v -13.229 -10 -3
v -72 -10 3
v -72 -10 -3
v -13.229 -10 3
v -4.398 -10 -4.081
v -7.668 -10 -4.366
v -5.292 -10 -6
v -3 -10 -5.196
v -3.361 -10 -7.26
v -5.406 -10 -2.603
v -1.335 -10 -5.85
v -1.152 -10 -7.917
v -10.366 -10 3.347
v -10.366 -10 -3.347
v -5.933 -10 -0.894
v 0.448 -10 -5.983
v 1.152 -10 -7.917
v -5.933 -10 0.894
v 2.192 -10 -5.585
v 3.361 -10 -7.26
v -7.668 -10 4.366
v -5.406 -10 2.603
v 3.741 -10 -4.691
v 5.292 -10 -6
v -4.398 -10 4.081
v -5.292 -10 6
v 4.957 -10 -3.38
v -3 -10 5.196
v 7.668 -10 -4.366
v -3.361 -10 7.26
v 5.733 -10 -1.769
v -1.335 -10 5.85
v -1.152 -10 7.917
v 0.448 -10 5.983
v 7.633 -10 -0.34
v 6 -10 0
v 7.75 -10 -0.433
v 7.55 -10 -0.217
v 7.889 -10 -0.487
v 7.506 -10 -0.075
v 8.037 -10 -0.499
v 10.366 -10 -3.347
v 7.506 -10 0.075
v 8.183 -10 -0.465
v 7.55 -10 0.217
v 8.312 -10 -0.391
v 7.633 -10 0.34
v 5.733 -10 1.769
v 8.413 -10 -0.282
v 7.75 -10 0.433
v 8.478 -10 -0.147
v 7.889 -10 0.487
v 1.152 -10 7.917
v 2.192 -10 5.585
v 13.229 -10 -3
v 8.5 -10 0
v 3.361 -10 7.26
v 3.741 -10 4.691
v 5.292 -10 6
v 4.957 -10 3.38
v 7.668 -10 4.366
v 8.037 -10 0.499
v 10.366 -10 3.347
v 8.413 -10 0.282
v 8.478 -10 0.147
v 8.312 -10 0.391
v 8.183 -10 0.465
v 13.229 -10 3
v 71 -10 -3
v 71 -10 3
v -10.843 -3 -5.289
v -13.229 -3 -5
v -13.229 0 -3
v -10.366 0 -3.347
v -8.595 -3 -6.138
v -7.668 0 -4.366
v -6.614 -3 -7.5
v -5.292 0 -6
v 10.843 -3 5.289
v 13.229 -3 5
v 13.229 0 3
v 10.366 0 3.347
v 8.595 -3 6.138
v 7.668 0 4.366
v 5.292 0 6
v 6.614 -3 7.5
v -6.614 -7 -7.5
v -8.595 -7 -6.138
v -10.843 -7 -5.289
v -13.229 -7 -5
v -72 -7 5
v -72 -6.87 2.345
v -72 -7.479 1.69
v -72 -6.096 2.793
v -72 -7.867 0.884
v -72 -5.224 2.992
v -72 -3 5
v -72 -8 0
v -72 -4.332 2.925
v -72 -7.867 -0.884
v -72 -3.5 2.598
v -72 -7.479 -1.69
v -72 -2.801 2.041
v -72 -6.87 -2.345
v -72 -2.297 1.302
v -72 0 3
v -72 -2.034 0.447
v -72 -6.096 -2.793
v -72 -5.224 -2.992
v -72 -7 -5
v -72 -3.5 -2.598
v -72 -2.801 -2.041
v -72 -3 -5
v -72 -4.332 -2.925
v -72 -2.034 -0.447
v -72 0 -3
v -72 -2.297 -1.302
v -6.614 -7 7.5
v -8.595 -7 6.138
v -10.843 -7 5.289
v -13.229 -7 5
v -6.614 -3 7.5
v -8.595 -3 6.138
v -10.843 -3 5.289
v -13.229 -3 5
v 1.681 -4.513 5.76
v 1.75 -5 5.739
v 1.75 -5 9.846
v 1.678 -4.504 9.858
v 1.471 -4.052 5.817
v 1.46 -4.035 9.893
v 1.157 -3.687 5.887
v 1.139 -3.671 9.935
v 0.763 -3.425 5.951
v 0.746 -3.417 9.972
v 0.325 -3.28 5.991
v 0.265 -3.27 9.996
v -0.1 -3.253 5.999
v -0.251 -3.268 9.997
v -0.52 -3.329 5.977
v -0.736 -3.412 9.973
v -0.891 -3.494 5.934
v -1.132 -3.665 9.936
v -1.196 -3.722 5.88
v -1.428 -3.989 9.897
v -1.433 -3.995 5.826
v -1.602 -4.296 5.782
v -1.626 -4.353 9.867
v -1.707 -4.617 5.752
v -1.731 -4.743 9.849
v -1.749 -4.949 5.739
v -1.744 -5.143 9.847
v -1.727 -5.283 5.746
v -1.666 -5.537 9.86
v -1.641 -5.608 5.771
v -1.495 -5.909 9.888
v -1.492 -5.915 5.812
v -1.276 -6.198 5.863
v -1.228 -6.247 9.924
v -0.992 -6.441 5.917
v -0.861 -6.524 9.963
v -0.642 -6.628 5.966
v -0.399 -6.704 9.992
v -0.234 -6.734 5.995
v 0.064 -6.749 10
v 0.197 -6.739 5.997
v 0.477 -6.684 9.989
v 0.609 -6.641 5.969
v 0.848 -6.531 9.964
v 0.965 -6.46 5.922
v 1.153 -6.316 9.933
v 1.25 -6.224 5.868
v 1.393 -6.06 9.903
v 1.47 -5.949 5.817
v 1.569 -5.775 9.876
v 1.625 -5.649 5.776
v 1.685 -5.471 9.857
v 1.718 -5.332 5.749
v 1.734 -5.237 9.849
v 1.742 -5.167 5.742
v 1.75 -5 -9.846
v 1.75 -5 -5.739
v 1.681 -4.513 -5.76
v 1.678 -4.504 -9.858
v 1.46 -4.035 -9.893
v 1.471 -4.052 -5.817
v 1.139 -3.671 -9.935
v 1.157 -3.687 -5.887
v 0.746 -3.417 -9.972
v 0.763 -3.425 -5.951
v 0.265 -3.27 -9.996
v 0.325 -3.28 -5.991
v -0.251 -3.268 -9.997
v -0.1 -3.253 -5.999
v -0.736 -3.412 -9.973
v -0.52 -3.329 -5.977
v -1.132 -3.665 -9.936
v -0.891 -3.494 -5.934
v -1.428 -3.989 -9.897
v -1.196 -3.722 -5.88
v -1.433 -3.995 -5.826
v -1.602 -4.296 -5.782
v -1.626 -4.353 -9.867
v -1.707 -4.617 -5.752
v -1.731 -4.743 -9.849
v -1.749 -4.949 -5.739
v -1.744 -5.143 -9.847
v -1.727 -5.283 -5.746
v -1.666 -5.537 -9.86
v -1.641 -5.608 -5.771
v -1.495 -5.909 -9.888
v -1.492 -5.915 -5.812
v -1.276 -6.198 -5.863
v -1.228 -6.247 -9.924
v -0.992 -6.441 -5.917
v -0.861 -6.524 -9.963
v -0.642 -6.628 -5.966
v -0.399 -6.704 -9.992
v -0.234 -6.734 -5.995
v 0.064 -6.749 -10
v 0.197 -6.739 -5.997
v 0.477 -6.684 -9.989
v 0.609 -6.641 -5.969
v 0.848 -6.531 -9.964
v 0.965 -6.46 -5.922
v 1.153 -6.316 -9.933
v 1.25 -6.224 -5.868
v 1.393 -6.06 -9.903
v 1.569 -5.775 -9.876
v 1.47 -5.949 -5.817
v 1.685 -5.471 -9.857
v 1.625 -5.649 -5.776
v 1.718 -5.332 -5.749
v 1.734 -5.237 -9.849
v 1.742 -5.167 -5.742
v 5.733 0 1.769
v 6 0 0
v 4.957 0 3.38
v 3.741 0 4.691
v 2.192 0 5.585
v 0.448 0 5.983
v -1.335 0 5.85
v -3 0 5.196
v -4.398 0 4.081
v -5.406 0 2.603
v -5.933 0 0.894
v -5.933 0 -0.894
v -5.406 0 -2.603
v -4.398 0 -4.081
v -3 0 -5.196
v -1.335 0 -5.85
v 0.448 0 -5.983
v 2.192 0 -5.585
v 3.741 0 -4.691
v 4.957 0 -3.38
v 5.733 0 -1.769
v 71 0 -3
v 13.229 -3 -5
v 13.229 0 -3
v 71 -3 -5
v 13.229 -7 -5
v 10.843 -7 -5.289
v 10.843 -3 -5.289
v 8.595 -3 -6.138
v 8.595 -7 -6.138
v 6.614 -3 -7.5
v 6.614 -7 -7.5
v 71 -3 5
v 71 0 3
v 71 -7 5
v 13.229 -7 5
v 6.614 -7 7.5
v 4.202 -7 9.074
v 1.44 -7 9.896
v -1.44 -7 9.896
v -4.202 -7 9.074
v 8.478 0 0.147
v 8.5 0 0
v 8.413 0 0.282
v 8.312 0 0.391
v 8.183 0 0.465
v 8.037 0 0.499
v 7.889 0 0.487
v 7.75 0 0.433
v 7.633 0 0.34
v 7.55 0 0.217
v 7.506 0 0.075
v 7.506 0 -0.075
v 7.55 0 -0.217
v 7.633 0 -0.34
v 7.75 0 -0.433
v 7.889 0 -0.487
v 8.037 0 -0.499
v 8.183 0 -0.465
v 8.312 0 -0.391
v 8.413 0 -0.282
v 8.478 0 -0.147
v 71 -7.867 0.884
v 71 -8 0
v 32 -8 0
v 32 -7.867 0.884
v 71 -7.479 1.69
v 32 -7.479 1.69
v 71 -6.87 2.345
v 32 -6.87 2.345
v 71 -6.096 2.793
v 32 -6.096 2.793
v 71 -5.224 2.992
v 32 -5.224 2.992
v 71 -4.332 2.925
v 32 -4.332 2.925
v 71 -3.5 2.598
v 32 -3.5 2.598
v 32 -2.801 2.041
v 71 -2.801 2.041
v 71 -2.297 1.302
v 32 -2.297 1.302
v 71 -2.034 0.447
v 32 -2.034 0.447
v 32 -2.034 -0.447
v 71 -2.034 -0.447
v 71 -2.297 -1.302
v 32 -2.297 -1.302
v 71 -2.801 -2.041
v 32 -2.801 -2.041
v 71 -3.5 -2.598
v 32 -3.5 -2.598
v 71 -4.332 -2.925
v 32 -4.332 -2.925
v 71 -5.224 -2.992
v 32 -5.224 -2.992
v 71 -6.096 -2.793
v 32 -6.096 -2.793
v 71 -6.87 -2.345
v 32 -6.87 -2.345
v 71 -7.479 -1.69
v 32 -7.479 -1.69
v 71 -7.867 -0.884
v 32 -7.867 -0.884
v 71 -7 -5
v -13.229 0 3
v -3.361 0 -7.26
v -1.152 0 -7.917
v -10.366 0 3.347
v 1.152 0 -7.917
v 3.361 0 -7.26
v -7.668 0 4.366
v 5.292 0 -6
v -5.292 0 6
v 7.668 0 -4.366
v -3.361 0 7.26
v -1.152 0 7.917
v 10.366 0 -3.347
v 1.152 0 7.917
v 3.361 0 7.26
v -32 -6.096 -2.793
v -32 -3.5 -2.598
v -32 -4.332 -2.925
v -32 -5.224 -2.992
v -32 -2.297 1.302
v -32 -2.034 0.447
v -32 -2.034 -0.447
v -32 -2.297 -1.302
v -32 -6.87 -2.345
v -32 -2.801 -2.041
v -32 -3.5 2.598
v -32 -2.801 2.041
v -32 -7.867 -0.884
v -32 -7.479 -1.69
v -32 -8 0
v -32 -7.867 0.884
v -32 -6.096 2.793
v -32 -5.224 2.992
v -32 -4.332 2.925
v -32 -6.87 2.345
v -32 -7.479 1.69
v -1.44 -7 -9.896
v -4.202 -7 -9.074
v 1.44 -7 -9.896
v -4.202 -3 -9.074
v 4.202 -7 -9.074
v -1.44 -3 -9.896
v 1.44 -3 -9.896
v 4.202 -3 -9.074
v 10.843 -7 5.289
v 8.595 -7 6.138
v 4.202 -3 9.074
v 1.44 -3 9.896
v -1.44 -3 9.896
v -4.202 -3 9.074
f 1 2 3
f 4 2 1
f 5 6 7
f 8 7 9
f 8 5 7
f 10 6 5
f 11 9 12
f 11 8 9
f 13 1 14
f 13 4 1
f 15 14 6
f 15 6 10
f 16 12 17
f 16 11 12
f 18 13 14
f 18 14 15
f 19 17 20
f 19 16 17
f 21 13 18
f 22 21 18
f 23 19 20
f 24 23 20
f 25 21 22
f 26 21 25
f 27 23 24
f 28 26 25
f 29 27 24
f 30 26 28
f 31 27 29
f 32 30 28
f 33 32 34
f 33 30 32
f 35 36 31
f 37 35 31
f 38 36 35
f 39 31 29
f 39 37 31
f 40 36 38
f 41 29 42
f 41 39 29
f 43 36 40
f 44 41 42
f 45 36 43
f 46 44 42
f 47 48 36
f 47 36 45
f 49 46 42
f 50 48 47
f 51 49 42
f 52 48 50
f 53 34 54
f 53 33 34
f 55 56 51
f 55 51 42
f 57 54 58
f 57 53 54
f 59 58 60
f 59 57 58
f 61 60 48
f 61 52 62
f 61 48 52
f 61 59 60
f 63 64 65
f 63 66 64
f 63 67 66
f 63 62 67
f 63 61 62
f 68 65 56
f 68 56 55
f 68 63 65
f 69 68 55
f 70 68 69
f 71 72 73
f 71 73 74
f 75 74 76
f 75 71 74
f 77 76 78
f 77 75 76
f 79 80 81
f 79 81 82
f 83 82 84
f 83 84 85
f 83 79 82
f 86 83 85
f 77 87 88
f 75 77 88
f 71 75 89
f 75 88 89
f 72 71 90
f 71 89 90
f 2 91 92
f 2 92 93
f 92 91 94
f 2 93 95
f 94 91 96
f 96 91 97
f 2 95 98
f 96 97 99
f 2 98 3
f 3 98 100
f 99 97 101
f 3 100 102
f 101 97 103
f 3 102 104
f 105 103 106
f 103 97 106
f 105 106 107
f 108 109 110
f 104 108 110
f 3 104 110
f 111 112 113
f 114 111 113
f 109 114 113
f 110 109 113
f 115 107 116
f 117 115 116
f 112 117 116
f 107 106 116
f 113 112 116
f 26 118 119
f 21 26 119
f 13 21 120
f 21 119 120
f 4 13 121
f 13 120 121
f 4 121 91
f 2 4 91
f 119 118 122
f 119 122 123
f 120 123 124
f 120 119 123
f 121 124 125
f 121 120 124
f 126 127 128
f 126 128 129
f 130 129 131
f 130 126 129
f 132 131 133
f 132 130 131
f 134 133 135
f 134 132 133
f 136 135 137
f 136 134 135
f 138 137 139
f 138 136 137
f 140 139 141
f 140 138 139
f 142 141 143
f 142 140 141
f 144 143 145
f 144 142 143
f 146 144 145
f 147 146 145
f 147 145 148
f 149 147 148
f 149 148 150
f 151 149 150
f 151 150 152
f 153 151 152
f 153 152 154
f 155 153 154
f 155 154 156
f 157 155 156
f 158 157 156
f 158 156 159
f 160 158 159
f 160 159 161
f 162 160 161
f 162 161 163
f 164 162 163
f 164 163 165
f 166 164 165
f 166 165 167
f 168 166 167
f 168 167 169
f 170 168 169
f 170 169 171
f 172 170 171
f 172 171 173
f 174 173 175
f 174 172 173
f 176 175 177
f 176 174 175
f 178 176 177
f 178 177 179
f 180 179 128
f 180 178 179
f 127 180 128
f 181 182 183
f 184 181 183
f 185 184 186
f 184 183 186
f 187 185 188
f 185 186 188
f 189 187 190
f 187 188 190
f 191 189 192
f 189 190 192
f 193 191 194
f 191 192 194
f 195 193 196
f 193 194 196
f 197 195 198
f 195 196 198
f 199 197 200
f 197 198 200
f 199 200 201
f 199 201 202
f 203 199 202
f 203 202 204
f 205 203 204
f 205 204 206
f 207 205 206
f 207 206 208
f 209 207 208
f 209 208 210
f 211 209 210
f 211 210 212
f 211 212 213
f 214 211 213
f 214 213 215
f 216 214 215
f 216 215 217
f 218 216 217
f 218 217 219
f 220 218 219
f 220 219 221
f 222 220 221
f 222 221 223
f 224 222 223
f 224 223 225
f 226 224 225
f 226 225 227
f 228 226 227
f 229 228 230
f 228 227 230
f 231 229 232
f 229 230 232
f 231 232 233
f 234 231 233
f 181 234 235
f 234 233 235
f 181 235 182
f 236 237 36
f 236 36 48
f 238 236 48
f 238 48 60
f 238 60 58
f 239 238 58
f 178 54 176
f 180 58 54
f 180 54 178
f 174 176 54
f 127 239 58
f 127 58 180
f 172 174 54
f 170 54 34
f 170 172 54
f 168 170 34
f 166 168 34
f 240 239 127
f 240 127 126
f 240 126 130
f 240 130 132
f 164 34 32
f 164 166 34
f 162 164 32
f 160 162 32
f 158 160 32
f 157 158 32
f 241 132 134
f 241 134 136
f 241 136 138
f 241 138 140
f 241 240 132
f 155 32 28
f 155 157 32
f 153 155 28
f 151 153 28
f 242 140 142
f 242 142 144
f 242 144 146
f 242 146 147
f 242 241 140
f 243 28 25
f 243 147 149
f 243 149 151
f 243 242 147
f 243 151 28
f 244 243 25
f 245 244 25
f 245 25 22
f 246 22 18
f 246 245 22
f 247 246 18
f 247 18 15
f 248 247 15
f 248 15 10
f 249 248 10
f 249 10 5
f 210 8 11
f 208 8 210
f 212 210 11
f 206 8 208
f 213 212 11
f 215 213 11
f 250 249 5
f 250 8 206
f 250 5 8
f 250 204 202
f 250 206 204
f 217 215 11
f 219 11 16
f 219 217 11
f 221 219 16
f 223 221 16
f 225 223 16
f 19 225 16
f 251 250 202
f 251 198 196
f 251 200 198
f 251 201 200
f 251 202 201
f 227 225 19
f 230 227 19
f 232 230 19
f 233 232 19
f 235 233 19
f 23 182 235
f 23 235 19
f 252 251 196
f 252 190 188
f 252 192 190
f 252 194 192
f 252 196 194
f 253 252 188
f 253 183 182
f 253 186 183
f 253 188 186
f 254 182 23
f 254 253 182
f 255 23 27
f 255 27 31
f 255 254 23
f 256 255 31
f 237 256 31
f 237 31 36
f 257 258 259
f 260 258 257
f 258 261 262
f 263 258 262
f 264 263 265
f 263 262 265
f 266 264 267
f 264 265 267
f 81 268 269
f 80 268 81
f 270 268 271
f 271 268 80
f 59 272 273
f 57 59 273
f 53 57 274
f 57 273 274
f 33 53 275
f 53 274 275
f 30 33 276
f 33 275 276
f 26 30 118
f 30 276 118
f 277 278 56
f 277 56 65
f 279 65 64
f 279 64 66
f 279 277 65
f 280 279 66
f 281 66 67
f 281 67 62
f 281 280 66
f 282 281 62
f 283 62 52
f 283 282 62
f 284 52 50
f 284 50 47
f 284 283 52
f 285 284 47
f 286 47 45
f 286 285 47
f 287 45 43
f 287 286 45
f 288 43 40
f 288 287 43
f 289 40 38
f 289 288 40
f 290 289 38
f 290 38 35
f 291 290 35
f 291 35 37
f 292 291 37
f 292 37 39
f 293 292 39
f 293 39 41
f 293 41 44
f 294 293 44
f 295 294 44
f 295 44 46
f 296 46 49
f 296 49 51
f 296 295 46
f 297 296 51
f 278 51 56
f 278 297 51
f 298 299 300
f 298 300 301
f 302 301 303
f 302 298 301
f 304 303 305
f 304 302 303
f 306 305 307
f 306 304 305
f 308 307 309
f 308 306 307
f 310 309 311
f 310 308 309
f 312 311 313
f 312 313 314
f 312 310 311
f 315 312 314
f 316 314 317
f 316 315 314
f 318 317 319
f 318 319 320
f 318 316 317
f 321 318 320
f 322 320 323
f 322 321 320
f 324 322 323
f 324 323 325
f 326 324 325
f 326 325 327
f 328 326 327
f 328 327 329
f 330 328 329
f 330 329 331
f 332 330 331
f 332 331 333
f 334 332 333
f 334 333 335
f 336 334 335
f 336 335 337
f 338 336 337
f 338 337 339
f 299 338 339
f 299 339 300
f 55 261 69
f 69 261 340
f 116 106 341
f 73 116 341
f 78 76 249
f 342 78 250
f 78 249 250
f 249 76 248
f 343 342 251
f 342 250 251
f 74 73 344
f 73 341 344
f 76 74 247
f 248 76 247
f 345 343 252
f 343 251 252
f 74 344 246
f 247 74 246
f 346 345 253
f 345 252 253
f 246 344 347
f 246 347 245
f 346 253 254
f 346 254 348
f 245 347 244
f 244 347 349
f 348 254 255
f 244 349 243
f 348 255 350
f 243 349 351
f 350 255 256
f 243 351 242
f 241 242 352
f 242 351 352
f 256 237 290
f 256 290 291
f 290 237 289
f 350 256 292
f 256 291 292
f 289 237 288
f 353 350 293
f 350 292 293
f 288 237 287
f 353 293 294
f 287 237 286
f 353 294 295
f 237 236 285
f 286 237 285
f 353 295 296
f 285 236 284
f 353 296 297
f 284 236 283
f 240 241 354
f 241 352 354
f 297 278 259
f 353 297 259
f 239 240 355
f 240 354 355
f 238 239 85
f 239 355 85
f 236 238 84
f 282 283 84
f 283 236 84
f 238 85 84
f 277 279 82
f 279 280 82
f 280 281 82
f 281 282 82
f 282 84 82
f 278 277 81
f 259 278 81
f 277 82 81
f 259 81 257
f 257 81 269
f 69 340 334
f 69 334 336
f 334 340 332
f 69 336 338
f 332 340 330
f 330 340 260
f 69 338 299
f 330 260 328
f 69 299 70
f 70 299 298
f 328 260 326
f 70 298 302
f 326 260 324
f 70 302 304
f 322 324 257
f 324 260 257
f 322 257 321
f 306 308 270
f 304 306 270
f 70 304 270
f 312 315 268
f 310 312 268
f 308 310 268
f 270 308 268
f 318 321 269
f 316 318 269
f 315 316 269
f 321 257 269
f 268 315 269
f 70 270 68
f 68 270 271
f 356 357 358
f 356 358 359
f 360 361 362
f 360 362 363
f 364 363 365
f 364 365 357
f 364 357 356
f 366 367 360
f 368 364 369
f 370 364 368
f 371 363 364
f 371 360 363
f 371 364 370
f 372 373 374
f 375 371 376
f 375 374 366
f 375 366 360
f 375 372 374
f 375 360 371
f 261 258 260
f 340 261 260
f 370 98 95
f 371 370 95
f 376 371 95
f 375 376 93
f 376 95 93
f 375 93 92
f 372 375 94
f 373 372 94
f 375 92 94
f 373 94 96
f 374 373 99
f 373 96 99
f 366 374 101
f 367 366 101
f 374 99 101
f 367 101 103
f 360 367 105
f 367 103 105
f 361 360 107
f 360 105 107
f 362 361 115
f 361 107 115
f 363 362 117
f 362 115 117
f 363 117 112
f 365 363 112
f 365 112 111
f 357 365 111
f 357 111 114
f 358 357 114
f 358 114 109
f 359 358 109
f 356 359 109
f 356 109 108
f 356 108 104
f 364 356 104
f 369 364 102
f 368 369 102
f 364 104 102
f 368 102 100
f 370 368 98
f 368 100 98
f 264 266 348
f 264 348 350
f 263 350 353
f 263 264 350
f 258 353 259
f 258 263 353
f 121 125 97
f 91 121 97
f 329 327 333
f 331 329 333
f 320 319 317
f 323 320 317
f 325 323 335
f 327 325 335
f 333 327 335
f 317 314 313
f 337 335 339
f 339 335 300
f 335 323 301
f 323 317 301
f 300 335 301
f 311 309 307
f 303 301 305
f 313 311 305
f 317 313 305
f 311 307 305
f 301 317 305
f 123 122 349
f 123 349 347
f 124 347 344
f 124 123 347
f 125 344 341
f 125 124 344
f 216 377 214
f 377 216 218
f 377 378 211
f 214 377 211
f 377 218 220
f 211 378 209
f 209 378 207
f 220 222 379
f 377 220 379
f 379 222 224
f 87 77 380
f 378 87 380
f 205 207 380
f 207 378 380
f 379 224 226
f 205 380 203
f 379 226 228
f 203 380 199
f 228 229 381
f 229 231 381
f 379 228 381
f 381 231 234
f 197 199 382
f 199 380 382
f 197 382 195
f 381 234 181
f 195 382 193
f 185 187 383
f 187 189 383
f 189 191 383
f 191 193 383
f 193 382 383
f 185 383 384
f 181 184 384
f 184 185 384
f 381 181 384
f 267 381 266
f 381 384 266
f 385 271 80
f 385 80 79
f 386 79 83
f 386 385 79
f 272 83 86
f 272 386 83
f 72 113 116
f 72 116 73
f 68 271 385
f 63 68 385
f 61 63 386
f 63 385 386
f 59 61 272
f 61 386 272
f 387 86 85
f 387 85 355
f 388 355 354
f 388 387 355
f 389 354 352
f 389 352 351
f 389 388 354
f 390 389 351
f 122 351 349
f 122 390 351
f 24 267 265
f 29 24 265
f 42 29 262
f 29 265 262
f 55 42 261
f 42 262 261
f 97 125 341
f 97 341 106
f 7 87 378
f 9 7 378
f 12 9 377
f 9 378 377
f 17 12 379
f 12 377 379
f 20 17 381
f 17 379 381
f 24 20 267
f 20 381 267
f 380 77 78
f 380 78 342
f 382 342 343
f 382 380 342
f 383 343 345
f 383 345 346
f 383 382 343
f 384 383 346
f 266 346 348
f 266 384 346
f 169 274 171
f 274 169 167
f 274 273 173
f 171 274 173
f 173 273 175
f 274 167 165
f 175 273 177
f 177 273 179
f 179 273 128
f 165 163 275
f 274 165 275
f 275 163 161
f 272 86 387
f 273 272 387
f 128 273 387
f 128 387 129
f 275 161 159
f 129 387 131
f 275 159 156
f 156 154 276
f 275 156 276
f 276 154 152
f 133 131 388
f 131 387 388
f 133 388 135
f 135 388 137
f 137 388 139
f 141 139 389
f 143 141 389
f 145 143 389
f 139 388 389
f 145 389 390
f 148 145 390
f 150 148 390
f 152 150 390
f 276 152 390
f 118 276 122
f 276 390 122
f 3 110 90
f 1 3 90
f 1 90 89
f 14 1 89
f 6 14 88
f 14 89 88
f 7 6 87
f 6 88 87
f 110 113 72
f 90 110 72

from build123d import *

# Parameters (mm, degrees)
F0_R          = 6
F0_R_2        = 0.5
F1_DEPTH      = 10
F2_R          = 3
F3_DEPTH      = 40
F4_R          = 1.75
F5_DEPTH      = 10.001
F5_DEPTH_BACK = 10.001
F6_R          = 10
F7_SIZE2      = 3
F7_SIZE       = 2
F7_2_SIZE2    = 3
F7_2_SIZE     = 2


# Not quite as in the source:
# - a pattern or mirror of a feature is missing from the dataset's text; its kind, count and spacing are read off the source's solid


with BuildPart() as f1:
    # F0 (on Front) → F1 (new body)
    with BuildSketch(Plane.XZ):
        with BuildLine():
            Line((71, 5), (8.6602540378, 5))
            ThreePointArc((8.6602540378, 5), (0, 10), (-8.6602540378, 5))
            Line((-8.6602540378, 5), (-72, 5))
            Line((-72, 5), (-72, -5))
            Line((-72, -5), (-8.6602540378, -5))
            ThreePointArc((-8.6602540378, -5), (0, -10), (8.6602540378, -5))
            Line((8.6602540378, -5), (71, -5))
            Line((71, -5), (71, 5))
        make_face()
        Circle(F0_R, mode=Mode.SUBTRACT)
        with Locations((8, 0)):
            Circle(F0_R_2, mode=Mode.SUBTRACT)
    extrude(amount=F1_DEPTH)

    # F2 (on face) → F3 (cut)
    with BuildSketch(Plane(origin=(-72, 0, 0), x_dir=(0, -1, 0), z_dir=(-1, 0, 0))):
        with Locations((5, 0)):
            Circle(F2_R)
    f3 = extrude(amount=-F3_DEPTH, mode=Mode.SUBTRACT)

    # F3_copies: F3 across plane
    add(f3.mirror(Plane(origin=(0, 0, 0), x_dir=(0, 0, 1), z_dir=(1, 0, 0))), mode=Mode.SUBTRACT)

    # F4 (on Top) → F5 (cut, two sides)
    with BuildSketch(Plane.XY) as f5_sk:
        with Locations((0, -5)):
            Circle(F4_R)
    extrude(amount=-F5_DEPTH, mode=Mode.SUBTRACT)
    extrude(f5_sk.sketch, amount=F5_DEPTH_BACK, mode=Mode.SUBTRACT)

    # F6
    f6_edges = [f1.edges().sort_by_distance(p)[0] for p in [
        (-8.660254, -5, 5),
        (8.660254, -5, 5),
        (8.660254, -5, -5),
        (-8.660254, -5, -5),
    ]]
    fillet(f6_edges, radius=F6_R)

    # F7
    f7_edges = [f1.edges().sort_by_distance(p)[0] for p in [
        (-42.614378, -10, 5),
        (-42.614378, -10, -5),
    ]]
    f7_side = f1.faces().sort_by_distance((42.114378, -10, -3.556082))[0]
    chamfer(f7_edges, length=F7_SIZE, length2=F7_SIZE2, reference=f7_side)

    # F7#2
    f7_2_edges = [f1.edges().sort_by_distance(p)[0] for p in [
        (-42.614378, 0, 5),
        (-42.614378, 0, -5),
    ]]
    f7_2_side = f1.faces().sort_by_distance((42.114378, 0, -3.556082))[0]
    chamfer(f7_2_edges, length=F7_2_SIZE, length2=F7_2_SIZE2, reference=f7_2_side)


solid = f1.part
